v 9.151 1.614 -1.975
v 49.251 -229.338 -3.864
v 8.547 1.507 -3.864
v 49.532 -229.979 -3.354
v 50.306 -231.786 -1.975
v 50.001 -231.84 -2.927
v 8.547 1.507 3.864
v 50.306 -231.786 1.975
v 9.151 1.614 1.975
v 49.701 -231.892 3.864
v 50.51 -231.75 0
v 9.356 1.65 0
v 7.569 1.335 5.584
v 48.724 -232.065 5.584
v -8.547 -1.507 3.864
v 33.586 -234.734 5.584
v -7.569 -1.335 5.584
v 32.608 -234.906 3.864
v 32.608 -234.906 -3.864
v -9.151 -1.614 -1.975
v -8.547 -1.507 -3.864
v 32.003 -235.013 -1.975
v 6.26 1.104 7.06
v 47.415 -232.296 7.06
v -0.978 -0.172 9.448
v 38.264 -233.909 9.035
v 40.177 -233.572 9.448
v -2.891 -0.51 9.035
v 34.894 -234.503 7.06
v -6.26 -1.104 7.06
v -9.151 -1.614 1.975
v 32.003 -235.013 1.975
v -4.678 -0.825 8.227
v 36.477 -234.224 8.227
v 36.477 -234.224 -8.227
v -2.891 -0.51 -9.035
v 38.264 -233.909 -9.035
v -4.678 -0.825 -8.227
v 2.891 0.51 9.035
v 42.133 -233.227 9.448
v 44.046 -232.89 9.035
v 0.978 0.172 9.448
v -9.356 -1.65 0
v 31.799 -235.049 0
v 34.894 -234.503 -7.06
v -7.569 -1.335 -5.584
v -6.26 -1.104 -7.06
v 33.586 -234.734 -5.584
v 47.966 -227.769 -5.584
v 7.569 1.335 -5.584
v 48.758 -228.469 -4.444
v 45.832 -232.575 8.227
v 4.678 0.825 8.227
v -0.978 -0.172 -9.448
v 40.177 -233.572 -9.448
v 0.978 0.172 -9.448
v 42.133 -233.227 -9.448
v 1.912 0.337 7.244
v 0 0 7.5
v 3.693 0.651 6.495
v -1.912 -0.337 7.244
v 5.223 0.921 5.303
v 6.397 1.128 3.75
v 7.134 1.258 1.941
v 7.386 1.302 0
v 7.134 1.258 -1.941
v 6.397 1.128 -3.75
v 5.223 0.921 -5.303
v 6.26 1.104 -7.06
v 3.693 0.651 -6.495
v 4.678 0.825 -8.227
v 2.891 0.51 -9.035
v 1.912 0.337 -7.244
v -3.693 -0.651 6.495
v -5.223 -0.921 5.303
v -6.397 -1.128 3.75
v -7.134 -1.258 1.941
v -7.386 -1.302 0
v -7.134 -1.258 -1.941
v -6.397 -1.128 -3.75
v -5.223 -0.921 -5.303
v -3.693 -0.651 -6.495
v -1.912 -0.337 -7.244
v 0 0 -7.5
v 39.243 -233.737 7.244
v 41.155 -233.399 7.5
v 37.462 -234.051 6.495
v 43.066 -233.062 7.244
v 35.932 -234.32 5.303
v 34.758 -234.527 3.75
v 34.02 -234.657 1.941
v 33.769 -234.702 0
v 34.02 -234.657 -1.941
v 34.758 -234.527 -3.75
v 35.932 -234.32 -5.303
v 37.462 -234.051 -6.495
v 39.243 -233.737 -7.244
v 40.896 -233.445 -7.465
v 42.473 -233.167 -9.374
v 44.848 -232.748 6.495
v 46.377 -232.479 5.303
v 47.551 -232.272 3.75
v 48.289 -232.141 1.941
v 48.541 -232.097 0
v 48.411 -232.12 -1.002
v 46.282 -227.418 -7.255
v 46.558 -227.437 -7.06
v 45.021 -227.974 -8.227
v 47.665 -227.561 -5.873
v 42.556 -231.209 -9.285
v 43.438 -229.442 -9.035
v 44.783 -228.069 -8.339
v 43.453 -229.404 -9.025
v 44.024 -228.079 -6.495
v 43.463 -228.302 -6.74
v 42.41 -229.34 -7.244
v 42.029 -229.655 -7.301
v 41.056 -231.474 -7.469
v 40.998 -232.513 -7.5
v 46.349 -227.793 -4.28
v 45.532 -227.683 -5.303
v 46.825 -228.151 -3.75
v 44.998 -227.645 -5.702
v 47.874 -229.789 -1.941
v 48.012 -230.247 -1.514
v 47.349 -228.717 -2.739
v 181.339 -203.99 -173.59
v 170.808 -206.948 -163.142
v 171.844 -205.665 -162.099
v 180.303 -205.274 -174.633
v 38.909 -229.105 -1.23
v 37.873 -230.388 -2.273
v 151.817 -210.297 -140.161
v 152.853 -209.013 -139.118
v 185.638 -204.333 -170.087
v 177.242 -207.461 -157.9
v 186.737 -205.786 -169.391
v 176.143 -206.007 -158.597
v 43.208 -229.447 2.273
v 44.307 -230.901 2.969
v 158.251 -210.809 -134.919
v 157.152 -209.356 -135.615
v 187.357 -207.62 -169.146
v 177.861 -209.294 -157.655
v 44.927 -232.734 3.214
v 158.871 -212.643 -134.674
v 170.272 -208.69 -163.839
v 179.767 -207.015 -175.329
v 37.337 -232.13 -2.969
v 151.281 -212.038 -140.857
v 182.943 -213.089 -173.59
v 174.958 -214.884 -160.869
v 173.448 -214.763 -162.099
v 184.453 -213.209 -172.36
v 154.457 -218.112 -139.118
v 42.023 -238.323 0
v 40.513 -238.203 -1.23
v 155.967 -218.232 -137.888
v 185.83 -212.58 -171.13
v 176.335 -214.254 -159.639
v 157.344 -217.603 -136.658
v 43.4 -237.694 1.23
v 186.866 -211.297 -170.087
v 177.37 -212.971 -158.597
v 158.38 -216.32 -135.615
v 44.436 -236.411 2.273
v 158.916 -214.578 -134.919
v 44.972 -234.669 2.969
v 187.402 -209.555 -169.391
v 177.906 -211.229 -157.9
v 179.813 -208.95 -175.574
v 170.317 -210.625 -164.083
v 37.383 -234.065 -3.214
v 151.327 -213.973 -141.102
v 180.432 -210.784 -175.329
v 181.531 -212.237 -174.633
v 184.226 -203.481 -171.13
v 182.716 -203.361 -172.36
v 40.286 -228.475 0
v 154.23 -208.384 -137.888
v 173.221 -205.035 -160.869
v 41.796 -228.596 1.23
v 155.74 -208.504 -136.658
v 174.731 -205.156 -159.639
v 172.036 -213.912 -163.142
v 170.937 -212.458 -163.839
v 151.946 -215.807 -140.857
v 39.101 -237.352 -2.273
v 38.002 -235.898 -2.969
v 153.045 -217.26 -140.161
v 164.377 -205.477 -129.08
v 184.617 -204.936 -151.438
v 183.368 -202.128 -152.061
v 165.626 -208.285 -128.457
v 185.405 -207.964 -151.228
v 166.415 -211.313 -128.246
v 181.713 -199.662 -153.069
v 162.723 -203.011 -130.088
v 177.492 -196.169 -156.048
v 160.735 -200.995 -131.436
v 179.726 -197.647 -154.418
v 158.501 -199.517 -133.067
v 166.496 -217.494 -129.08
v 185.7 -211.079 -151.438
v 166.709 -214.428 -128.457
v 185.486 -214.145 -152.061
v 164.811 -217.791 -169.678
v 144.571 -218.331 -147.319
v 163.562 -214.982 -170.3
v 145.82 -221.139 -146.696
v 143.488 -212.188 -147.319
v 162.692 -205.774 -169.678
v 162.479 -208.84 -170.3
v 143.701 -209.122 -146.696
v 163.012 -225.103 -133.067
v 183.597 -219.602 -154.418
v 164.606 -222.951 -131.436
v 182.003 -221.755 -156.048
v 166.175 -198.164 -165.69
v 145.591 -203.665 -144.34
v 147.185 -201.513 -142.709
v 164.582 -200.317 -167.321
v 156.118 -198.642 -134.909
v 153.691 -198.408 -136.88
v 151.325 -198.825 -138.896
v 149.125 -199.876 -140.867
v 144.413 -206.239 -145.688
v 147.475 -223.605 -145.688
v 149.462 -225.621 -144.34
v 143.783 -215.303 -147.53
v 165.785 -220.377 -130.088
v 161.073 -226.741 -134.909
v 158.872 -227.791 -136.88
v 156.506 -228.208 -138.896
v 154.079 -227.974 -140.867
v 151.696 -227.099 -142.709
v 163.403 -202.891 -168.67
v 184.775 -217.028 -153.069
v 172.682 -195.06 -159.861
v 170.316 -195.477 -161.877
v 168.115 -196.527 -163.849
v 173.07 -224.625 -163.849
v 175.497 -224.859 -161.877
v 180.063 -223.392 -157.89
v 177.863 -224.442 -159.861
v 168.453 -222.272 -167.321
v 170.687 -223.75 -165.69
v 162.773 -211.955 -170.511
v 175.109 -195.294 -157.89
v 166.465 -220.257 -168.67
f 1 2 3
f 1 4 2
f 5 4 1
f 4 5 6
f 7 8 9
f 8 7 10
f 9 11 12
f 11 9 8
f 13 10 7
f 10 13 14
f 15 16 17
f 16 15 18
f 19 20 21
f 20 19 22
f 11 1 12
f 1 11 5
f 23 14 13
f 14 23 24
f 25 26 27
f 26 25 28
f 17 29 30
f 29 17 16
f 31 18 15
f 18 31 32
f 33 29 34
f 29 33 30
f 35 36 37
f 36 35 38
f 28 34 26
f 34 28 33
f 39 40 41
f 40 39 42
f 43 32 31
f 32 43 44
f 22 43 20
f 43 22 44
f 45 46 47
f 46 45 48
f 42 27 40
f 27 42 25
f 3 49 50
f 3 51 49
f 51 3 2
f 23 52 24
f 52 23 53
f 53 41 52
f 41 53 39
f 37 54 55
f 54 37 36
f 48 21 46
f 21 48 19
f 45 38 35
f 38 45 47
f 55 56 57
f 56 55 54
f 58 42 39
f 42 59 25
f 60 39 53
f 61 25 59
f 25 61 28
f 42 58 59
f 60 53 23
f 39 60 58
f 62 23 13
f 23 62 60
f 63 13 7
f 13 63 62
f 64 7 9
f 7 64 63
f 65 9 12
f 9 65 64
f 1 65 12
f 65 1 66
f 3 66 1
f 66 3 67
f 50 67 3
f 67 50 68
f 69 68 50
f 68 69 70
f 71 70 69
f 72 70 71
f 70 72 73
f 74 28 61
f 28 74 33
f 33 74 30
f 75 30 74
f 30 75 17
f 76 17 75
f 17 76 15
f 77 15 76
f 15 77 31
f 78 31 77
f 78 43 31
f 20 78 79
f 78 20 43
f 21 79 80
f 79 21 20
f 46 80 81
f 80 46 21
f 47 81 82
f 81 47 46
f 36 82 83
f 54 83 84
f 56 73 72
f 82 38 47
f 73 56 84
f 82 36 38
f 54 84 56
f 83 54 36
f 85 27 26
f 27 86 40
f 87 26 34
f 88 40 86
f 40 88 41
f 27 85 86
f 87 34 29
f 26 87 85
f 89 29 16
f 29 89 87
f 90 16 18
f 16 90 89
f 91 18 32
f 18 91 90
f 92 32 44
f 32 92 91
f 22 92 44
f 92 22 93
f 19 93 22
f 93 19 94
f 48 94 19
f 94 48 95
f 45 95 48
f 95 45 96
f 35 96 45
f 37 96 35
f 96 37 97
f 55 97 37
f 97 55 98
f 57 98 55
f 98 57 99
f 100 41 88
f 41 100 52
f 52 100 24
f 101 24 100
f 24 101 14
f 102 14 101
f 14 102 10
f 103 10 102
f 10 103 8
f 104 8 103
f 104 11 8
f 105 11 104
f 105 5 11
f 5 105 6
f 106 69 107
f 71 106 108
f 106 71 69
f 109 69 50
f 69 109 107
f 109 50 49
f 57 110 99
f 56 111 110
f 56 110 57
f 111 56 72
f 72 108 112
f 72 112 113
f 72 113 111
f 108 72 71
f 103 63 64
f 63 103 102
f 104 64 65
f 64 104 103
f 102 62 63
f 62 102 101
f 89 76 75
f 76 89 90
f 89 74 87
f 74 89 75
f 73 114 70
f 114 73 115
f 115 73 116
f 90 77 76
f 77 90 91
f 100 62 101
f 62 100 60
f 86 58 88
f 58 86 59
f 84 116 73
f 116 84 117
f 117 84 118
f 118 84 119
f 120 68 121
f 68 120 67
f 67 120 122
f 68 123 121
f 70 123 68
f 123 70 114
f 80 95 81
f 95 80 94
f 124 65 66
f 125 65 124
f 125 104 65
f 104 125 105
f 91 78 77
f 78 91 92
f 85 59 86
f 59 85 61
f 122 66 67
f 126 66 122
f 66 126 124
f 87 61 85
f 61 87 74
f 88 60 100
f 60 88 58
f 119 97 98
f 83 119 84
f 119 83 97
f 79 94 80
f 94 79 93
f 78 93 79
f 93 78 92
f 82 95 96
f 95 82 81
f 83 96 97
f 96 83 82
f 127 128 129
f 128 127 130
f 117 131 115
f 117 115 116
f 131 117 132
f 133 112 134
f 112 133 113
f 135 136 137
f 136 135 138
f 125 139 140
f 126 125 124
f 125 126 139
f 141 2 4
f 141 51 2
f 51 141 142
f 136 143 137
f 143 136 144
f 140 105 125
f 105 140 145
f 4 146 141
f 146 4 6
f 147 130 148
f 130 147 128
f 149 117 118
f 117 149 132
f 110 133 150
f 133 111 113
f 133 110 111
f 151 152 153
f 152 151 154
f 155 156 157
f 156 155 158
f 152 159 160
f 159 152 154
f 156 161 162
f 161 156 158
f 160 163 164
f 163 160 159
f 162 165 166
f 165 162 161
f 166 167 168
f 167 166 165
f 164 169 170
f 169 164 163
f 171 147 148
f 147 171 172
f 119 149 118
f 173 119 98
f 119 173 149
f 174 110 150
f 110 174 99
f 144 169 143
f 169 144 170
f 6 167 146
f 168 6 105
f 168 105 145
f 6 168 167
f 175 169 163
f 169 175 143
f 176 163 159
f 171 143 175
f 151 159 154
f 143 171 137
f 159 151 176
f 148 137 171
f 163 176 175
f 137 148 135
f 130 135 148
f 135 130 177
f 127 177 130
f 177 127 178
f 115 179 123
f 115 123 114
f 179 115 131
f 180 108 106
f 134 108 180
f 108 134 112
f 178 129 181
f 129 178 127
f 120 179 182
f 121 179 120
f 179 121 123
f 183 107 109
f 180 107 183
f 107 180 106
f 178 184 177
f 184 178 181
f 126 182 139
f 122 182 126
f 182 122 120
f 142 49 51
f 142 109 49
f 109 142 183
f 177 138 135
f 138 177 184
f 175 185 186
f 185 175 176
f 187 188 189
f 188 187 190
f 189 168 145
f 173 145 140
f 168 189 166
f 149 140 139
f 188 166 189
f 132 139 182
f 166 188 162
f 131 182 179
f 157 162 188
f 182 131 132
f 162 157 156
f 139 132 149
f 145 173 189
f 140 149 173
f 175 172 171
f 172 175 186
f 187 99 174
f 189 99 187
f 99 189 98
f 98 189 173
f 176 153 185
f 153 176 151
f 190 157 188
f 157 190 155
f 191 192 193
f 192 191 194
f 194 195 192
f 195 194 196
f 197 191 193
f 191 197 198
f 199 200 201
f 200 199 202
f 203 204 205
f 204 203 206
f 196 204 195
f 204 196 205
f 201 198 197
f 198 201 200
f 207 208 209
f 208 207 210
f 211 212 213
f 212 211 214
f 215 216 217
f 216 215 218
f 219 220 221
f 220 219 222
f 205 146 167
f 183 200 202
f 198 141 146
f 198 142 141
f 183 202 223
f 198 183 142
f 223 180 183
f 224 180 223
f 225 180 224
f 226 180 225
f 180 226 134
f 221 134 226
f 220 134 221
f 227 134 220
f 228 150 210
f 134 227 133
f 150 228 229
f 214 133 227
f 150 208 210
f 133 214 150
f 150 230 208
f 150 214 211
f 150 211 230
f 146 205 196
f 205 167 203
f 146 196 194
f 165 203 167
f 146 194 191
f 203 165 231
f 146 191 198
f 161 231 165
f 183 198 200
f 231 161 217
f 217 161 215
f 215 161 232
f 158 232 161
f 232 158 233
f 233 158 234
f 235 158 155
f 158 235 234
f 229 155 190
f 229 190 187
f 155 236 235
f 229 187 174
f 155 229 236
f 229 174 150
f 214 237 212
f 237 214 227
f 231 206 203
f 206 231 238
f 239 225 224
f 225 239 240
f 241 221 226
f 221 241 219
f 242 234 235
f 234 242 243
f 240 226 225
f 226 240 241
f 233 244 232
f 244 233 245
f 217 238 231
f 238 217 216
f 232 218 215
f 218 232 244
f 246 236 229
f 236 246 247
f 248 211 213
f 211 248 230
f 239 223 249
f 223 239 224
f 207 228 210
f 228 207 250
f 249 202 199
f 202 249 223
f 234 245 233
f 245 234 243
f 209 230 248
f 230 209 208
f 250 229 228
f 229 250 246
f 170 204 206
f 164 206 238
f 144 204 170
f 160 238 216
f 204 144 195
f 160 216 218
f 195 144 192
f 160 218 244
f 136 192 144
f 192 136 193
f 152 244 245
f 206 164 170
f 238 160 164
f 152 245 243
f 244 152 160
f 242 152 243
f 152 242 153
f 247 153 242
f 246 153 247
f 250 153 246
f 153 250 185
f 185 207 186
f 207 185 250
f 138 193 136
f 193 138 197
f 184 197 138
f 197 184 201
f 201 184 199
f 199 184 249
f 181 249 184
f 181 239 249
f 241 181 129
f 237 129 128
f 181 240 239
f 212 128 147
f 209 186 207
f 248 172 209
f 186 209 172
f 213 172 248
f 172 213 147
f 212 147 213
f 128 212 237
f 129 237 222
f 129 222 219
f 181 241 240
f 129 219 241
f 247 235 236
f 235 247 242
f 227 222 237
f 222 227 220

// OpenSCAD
// ==================== PARÁMETROS ====================
L_pendulo = 225;          
L_peso = 30;              
r_peso = 15;
r_varilla = 5;

armlength = 237;
pared = 2;
diam_tubo_arm = 19;
radio_ext = diam_tubo_arm / 2;
radio_int = radio_ext - pared;

// ==================== MÓDULOS ====================


// Brazo: se extiende a lo largo del eje Y positivo
module arm(){
    rotate([90, 0, 0]) {
        difference(){
            cylinder(h=armlength, r=radio_ext, center=false);
            cylinder(h=armlength + 2, r=radio_int, center=false);
        }
    }
}



// Péndulo: su PIVOTE está en el origen (parte superior de la varilla)
module pendulo(angulo){
    rotate([0, -angulo, 0]) { // Gira alrededor del eje Y (eje del brazo)
        // Varilla (baja desde 0 hasta -225)
        translate([0, 0, -L_pendulo])
            cylinder(h=L_pendulo, r=r_varilla, center=false);
        // Peso (situado a 15mm del extremo)
        translate([0, 0, -210])
            cylinder(h=L_peso, r=r_peso, center=false);
    }
}



// Sistema completo del péndulo de Furuta
module furuta(theta, alpha){
    rotate([0, 0, theta]) {        // 1. Rotación del brazo en el plano horizontal
        color("orangered")
        arm();                      // Dibuja el brazo desde el origen
        
        color("gray")
        translate([0,-armlength, 0]) { // 2. Traslada al extremo del brazo
            pendulo(alpha);          // 3. Dibuja el péndulo con su inclinación
        }
    }
}

// ==================== EJEMPLO ====================
// theta = ángulo del brazo (en grados), alpha = inclinación del péndulo (en grados)
//furuta(360*$t, 30*sin(360*$t*2)); 
furuta(10,40);
